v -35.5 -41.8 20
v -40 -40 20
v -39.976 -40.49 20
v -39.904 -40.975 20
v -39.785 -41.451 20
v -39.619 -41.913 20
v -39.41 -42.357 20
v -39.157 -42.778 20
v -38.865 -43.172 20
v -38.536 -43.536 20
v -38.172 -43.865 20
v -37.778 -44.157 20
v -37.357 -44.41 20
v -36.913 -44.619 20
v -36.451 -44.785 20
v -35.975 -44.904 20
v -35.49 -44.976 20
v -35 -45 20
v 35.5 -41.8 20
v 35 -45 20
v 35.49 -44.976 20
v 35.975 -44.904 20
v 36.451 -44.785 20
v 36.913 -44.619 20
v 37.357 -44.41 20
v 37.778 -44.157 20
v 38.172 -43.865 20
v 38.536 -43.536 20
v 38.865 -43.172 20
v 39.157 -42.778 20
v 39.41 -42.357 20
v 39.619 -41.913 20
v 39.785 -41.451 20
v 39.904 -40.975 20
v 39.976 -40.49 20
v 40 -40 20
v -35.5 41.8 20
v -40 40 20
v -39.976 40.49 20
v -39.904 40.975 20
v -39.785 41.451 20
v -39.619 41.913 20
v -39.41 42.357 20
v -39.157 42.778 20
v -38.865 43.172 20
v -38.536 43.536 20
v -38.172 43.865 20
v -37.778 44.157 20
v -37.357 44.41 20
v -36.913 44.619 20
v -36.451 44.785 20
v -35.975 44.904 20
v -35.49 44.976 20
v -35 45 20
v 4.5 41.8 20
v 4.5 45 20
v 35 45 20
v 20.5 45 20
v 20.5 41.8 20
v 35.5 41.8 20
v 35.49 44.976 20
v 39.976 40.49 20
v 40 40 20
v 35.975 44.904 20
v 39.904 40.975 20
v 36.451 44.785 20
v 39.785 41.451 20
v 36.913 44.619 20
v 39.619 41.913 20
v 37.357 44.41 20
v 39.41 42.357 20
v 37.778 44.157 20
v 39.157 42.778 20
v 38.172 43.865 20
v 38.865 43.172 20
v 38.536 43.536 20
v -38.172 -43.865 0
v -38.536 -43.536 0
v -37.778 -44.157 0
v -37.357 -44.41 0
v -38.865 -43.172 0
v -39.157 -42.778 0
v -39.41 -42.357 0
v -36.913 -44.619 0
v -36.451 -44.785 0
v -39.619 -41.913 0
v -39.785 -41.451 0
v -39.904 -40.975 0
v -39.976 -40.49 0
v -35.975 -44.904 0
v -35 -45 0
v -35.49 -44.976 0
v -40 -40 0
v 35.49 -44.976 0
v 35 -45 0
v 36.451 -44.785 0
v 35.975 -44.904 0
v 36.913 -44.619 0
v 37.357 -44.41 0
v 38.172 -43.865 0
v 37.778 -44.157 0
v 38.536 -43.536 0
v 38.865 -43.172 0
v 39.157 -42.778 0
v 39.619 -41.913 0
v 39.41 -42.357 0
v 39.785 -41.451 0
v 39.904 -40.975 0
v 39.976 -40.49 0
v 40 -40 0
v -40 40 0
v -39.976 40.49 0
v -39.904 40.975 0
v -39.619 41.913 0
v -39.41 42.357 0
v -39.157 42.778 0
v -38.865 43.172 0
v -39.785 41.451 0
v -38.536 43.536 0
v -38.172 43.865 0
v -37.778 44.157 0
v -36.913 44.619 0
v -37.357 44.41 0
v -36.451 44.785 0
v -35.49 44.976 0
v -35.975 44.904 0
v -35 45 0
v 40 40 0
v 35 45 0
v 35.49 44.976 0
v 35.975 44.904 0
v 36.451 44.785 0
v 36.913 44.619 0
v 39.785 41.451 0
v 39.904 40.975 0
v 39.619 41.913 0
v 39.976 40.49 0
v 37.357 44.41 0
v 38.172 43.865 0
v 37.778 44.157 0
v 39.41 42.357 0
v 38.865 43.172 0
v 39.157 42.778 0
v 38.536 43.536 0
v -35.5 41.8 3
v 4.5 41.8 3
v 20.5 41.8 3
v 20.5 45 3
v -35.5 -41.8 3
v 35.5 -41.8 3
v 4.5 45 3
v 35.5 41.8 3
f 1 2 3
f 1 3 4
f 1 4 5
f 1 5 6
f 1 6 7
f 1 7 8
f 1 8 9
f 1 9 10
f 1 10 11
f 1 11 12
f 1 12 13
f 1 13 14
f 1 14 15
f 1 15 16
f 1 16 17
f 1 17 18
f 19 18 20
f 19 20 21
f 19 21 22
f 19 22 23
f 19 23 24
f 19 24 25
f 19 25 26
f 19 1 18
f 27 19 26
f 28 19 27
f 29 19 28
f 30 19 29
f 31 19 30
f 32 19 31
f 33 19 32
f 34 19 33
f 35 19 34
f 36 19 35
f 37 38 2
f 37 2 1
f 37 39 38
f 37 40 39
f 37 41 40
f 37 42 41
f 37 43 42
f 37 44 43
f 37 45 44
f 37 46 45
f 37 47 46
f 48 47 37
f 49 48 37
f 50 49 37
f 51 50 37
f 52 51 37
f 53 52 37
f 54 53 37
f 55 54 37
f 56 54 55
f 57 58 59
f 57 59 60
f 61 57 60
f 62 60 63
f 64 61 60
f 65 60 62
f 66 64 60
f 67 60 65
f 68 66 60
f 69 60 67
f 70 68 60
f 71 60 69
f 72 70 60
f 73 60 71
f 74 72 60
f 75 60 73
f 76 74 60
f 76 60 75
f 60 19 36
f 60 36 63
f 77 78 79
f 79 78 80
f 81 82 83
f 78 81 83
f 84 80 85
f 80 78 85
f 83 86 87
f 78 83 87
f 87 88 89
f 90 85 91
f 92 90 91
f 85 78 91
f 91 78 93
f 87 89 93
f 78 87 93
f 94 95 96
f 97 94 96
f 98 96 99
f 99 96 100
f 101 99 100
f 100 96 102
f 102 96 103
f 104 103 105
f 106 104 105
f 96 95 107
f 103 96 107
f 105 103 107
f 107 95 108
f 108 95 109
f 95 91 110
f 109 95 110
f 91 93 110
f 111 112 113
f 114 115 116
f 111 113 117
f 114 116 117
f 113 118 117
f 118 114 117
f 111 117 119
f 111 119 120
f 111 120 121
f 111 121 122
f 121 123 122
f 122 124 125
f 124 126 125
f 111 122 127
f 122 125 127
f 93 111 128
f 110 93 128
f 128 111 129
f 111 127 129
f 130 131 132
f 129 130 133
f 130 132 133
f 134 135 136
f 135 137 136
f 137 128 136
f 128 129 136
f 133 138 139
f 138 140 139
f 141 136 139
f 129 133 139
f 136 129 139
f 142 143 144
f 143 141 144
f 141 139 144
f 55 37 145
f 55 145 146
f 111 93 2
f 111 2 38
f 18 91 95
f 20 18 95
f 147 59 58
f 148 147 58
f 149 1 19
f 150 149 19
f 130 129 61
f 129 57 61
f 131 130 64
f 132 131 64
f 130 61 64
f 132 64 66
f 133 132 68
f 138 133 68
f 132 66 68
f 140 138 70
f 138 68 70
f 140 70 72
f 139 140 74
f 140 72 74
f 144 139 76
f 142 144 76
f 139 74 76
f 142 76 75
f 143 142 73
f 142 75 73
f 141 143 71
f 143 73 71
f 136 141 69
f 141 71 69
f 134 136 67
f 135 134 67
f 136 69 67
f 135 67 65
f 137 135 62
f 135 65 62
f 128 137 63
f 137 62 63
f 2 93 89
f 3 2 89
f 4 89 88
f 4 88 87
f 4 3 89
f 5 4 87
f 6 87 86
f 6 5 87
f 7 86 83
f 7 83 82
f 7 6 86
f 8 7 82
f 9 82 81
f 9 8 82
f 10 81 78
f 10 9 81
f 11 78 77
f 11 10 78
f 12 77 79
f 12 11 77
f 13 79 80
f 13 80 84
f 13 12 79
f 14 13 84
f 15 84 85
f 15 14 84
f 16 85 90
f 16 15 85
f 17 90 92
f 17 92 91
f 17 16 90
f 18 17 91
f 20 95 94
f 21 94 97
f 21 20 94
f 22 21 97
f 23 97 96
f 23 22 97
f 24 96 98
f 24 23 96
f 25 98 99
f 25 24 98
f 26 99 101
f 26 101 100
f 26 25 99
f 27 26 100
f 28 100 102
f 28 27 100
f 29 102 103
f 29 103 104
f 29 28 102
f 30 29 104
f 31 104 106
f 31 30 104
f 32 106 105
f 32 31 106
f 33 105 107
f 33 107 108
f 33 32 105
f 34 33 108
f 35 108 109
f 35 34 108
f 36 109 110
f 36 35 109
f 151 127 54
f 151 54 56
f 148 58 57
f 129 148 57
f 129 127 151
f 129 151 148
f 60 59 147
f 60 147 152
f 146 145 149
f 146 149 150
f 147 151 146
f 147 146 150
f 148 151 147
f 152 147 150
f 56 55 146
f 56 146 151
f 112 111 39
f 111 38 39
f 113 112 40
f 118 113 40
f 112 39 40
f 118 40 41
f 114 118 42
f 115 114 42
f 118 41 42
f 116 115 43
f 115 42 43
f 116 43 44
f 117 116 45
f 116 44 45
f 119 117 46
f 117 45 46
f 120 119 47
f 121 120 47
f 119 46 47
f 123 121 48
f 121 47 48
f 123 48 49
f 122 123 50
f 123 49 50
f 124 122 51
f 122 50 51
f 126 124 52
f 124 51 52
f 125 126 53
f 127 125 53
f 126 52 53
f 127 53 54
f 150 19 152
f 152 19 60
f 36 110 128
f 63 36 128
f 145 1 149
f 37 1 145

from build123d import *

# Parameters (mm, degrees)
F0_W     = 80
F0_H     = 90
F1_DEPTH = 20
F2_W     = 71
F2_H     = 83.6
F3_DEPTH = 17
F4_W     = 16
F4_H     = 3.2
F5_DEPTH = 17
F6_R     = 5


with BuildPart() as f1:
    # F0 (on Top) → F1 (new body)
    with BuildSketch(Plane.XY):
        Rectangle(F0_W, F0_H)
    extrude(amount=F1_DEPTH)

    # F2 (on face) → F3 (cut)
    with BuildSketch(Plane.XY.offset(20)):
        Rectangle(F2_W, F2_H)
    extrude(amount=-F3_DEPTH, mode=Mode.SUBTRACT)

    # F4 (on face) → F5 (cut, through all)
    with BuildSketch(Plane.XY.offset(20)):
        with Locations((12.5, 43.4)):
            Rectangle(F4_W, F4_H)
    extrude(amount=-F5_DEPTH, mode=Mode.SUBTRACT)

    # F6
    f6_edges = [f1.edges().sort_by_distance(p)[0] for p in [
        (40, 45, 10),
        (-40, 45, 10),
        (40, -45, 10),
        (-40, -45, 10),
    ]]
    fillet(f6_edges, radius=F6_R)


solid = f1.part
